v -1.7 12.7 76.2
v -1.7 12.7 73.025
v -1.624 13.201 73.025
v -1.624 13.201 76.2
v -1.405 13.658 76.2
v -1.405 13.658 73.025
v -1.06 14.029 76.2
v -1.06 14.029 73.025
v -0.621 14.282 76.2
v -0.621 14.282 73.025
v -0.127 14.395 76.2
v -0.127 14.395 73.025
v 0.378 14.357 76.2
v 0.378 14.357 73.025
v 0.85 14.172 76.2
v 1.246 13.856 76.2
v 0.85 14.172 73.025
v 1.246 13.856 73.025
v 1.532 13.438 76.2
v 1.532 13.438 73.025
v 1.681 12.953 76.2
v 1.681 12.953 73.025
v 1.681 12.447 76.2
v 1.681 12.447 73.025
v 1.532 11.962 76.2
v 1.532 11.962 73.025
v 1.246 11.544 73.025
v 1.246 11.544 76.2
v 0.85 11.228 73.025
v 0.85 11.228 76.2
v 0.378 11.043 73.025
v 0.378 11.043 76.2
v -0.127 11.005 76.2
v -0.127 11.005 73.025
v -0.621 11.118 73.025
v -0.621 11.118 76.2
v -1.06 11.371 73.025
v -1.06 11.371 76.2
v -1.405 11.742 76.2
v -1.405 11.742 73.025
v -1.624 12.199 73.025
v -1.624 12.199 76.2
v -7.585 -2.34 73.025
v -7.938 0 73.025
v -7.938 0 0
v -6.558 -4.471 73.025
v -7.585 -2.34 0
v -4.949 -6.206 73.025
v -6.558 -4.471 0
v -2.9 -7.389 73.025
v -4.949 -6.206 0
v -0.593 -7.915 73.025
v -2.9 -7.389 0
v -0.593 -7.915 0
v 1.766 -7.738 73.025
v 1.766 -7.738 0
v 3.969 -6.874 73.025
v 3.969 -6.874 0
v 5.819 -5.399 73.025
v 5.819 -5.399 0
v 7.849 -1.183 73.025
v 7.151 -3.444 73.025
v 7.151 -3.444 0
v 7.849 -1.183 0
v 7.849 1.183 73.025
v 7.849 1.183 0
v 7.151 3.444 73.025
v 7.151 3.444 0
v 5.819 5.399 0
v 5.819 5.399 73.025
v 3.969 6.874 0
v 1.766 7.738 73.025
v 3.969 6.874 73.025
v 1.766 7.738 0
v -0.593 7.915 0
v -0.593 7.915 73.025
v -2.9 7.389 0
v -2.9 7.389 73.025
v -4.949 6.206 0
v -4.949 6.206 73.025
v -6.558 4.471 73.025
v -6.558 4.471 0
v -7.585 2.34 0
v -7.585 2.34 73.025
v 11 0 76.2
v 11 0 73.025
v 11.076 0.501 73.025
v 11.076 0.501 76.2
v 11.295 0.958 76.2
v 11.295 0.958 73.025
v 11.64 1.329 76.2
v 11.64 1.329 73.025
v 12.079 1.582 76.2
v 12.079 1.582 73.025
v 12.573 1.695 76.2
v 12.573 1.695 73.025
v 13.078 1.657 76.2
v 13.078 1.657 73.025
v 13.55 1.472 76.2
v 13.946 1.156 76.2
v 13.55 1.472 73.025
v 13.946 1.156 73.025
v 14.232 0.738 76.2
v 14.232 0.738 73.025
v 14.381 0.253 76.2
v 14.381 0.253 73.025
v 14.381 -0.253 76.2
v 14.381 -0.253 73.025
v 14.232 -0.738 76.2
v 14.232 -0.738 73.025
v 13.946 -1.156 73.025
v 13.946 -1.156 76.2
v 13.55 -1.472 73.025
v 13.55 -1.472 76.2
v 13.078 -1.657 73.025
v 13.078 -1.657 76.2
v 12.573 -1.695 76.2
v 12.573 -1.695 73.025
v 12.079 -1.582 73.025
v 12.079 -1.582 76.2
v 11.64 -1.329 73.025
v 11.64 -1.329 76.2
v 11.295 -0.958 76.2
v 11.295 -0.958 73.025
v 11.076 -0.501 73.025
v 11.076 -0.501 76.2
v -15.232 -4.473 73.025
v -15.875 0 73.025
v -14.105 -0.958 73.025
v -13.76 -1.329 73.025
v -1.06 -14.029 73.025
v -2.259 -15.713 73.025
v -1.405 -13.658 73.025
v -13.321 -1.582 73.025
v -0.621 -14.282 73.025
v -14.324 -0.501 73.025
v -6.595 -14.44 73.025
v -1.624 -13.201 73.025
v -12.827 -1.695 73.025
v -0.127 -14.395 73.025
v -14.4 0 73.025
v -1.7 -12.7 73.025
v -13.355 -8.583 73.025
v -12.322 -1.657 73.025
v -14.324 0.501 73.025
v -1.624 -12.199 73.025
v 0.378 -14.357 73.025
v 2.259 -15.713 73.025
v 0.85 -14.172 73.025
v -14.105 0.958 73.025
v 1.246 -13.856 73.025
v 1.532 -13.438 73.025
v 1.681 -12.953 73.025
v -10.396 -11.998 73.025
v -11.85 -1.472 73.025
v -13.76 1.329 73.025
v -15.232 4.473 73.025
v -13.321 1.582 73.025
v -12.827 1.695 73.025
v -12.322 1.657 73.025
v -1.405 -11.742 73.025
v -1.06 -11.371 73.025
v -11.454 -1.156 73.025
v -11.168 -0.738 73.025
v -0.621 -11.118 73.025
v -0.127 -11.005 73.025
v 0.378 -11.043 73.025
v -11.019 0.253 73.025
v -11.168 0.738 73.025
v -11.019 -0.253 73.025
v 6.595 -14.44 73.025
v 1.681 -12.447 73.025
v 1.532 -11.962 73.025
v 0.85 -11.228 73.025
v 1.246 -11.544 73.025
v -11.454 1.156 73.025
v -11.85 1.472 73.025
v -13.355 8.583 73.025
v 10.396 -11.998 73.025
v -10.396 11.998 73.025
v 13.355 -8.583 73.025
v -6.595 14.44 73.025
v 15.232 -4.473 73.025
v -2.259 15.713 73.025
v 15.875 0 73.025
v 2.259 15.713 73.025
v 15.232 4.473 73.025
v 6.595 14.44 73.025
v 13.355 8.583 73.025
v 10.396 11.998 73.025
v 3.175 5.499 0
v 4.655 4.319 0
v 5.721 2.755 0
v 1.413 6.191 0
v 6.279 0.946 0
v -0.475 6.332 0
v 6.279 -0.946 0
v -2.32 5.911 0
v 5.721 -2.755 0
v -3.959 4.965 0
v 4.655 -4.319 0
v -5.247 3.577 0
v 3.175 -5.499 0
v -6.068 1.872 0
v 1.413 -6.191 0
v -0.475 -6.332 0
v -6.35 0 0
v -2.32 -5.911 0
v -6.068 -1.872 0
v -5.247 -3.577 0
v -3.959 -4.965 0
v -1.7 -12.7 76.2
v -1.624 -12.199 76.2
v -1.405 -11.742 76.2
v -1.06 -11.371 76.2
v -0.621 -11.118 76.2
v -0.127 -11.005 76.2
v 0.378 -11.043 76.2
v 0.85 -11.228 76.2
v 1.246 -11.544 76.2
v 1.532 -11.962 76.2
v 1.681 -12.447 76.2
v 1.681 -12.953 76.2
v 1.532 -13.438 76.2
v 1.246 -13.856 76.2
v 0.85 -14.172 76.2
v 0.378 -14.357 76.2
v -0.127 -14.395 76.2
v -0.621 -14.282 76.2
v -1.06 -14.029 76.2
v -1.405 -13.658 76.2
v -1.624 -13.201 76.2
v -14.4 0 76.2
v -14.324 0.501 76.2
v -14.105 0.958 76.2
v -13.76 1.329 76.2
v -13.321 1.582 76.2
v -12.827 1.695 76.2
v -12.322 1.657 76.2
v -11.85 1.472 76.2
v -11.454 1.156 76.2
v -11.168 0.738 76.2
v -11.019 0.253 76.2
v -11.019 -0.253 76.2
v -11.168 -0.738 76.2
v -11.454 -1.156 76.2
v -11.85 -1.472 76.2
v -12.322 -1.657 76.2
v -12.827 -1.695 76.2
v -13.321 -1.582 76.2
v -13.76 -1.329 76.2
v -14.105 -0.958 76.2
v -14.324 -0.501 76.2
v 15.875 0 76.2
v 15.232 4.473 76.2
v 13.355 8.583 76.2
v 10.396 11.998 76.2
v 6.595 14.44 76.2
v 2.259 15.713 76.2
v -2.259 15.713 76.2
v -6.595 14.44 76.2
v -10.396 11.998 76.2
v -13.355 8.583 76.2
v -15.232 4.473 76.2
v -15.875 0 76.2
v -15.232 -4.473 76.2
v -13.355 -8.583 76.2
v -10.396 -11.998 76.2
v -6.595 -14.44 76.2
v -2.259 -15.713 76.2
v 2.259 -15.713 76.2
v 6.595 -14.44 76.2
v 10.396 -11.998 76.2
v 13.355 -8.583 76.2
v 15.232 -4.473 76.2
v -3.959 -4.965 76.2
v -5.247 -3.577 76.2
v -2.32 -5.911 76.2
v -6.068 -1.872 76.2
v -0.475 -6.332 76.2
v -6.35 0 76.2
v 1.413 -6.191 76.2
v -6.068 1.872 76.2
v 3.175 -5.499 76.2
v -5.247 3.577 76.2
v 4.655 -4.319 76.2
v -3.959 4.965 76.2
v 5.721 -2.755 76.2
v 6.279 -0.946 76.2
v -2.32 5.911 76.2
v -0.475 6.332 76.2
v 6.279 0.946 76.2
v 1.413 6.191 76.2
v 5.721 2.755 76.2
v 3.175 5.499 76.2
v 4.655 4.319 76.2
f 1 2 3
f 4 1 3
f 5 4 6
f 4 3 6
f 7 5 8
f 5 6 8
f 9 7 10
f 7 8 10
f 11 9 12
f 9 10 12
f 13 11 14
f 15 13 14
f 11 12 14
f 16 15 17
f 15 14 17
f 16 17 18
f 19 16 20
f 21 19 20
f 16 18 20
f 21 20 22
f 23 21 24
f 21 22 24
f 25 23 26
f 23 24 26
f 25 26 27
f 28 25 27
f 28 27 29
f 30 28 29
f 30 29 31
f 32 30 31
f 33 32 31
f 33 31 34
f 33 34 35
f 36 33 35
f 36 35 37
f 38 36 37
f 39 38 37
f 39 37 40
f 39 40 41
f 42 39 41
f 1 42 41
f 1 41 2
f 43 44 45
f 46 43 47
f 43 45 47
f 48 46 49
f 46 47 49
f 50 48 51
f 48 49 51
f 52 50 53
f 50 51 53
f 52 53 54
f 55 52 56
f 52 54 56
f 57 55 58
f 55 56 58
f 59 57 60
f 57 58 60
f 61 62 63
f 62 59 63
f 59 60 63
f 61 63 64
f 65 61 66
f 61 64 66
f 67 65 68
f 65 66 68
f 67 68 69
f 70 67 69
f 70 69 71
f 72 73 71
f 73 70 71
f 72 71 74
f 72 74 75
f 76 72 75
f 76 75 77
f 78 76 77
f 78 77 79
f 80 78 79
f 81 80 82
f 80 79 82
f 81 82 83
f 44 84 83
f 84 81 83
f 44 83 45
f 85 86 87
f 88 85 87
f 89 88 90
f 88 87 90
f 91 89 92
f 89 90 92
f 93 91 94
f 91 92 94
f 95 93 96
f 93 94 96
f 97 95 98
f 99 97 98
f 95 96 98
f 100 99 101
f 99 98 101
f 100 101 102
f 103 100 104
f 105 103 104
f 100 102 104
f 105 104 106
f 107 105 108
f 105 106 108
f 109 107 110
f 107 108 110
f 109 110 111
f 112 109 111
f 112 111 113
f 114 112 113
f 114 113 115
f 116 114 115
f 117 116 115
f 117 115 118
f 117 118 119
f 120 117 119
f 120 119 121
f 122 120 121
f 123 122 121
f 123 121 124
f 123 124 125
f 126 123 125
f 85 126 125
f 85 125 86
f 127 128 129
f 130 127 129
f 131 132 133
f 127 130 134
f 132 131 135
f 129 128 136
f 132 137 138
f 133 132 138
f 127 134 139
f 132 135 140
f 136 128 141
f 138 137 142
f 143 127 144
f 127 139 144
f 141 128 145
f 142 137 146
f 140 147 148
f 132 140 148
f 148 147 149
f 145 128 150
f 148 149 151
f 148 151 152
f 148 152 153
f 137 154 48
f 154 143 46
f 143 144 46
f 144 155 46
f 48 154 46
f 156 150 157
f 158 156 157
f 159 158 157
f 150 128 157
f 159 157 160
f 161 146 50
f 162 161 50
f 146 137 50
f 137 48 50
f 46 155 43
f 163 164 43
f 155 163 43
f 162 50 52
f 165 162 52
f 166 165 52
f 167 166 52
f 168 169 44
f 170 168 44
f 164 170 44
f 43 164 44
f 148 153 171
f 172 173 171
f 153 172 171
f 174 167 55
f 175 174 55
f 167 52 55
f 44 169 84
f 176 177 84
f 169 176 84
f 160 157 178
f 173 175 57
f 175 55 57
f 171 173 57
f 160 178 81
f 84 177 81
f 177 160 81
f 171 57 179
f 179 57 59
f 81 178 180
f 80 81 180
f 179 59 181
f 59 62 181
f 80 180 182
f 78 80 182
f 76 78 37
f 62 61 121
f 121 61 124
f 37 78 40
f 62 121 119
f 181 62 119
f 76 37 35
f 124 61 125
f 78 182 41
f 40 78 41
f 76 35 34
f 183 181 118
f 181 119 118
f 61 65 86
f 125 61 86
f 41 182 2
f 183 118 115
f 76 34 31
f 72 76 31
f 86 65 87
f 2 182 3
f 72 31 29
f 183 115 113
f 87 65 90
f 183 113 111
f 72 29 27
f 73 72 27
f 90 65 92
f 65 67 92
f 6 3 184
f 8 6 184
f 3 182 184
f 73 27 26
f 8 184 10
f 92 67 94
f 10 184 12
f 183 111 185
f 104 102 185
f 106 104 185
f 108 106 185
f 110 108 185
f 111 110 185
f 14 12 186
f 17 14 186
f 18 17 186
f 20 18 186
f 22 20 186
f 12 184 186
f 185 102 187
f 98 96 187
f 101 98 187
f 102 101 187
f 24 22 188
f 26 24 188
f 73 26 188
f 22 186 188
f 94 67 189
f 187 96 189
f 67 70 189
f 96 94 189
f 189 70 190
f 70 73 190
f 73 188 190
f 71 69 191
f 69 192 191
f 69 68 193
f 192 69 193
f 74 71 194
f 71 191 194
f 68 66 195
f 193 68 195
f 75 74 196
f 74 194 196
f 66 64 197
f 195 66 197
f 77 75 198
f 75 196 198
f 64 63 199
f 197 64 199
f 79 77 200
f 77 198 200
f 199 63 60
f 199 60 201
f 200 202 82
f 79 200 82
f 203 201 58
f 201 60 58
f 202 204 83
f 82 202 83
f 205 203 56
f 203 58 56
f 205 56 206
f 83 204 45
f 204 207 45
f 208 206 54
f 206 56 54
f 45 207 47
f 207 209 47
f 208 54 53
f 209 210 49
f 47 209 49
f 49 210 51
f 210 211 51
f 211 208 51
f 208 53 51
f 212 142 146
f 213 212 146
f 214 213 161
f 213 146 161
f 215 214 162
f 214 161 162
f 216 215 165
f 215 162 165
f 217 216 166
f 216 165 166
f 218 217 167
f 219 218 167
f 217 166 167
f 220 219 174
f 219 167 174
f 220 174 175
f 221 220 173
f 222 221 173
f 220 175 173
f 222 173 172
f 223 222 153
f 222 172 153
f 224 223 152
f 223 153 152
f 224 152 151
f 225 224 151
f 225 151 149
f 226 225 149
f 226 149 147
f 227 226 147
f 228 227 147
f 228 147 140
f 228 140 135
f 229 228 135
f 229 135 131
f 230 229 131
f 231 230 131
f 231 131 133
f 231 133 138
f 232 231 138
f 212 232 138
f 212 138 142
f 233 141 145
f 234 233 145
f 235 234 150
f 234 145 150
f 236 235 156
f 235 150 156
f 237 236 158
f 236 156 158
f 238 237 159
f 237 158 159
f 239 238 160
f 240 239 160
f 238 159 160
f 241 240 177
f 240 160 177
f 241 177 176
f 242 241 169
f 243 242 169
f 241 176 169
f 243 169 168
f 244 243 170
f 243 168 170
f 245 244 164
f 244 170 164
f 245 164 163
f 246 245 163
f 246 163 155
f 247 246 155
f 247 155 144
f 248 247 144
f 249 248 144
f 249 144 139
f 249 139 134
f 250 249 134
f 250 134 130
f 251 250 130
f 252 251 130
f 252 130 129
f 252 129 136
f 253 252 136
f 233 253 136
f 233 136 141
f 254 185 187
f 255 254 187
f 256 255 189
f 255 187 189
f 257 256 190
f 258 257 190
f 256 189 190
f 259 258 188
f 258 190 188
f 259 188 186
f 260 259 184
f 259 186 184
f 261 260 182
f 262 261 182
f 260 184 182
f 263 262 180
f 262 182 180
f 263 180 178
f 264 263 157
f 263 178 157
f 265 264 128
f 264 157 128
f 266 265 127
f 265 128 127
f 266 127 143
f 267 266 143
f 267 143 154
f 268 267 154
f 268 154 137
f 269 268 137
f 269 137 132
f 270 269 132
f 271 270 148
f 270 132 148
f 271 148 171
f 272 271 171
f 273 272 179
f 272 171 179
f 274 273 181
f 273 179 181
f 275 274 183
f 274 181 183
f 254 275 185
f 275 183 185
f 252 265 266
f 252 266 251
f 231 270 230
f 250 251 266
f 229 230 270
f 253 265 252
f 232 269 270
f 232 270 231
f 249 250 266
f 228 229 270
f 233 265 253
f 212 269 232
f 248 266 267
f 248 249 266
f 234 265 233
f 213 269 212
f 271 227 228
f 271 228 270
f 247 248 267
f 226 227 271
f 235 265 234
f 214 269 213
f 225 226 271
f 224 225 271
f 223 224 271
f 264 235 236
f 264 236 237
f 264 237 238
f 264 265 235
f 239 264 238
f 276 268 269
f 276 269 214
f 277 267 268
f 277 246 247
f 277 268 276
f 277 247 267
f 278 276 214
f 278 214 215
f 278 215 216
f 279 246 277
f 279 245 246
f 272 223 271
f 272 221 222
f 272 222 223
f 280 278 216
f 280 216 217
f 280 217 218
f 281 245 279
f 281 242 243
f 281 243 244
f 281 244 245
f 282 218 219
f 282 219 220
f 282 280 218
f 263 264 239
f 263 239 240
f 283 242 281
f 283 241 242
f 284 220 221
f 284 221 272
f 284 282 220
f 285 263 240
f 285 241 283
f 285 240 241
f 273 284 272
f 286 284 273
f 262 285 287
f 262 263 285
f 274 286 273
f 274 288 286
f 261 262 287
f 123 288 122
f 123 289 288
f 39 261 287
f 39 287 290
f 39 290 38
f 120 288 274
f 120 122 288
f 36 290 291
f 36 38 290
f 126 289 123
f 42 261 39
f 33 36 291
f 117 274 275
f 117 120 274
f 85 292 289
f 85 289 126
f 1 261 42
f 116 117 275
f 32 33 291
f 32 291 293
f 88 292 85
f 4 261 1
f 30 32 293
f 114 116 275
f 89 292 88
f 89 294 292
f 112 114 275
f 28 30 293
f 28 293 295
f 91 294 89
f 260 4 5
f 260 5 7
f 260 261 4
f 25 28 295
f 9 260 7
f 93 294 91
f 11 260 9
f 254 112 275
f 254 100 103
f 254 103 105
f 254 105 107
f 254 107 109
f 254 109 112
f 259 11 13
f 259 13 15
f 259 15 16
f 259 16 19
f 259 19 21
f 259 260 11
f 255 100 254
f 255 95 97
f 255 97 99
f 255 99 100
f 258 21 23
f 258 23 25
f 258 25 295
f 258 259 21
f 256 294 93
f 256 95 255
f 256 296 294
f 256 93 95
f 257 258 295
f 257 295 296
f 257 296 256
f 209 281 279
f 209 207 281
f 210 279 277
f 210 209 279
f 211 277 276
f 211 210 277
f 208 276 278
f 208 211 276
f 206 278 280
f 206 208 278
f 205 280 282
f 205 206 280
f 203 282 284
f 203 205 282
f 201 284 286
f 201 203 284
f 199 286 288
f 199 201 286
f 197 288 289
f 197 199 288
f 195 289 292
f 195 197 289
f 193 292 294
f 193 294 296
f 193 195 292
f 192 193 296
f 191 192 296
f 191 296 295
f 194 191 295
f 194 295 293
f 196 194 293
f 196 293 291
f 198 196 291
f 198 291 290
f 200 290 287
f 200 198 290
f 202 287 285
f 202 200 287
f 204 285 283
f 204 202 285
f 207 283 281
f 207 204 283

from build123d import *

# Parameters (mm, degrees)
SKETCH1_R                = 7.9375
SKETCH1_R_2              = 6.35
BOSS_EXTRUDE1_DEPTH      = 76.2
BOSS_EXTRUDE2_START      = -3.175
SKETCH2_R                = 15.875
SKETCH2_R_2              = 6.35
BOSS_EXTRUDE2_DEPTH      = 3.175
M3_CLEARANCE_HOLE1_D     = 3.4
M3_CLEARANCE_HOLE1_DEPTH = 4
M3_CLEARANCE_HOLE1_TIP   = 1.021463052


with BuildPart() as part:
    # Sketch1 → Boss-Extrude1 (new body)
    with BuildSketch(Plane.XY):
        with Locations(Location((0, 0, 0), (0, 0, 180))):
            Circle(SKETCH1_R)
        with Locations(Location((0, 0, 0), (0, 0, 180))):
            Circle(SKETCH1_R_2, mode=Mode.SUBTRACT)
    extrude(amount=BOSS_EXTRUDE1_DEPTH)

    # Sketch2 → Boss-Extrude2 (add)
    with BuildSketch(Plane.XY.offset(76.2).offset(BOSS_EXTRUDE2_START)):
        Circle(SKETCH2_R)
        with Locations(Location((0, 0, 0), (0, 0, 180))):
            Circle(SKETCH2_R_2, mode=Mode.SUBTRACT)
    extrude(amount=BOSS_EXTRUDE2_DEPTH)

    # M3 Clearance Hole1
    with Locations(Plane.XY.offset(76.2)):
        with Locations((0, 12.7), (0, -12.7), (12.7, 0), (-12.7, 0)):
            Hole(M3_CLEARANCE_HOLE1_D / 2, depth=M3_CLEARANCE_HOLE1_DEPTH)
            with Locations((0, 0, -(M3_CLEARANCE_HOLE1_DEPTH + M3_CLEARANCE_HOLE1_TIP / 2))):  # 118° drill point
                Cone(0, M3_CLEARANCE_HOLE1_D / 2, M3_CLEARANCE_HOLE1_TIP, mode=Mode.SUBTRACT)


solid = part.part
